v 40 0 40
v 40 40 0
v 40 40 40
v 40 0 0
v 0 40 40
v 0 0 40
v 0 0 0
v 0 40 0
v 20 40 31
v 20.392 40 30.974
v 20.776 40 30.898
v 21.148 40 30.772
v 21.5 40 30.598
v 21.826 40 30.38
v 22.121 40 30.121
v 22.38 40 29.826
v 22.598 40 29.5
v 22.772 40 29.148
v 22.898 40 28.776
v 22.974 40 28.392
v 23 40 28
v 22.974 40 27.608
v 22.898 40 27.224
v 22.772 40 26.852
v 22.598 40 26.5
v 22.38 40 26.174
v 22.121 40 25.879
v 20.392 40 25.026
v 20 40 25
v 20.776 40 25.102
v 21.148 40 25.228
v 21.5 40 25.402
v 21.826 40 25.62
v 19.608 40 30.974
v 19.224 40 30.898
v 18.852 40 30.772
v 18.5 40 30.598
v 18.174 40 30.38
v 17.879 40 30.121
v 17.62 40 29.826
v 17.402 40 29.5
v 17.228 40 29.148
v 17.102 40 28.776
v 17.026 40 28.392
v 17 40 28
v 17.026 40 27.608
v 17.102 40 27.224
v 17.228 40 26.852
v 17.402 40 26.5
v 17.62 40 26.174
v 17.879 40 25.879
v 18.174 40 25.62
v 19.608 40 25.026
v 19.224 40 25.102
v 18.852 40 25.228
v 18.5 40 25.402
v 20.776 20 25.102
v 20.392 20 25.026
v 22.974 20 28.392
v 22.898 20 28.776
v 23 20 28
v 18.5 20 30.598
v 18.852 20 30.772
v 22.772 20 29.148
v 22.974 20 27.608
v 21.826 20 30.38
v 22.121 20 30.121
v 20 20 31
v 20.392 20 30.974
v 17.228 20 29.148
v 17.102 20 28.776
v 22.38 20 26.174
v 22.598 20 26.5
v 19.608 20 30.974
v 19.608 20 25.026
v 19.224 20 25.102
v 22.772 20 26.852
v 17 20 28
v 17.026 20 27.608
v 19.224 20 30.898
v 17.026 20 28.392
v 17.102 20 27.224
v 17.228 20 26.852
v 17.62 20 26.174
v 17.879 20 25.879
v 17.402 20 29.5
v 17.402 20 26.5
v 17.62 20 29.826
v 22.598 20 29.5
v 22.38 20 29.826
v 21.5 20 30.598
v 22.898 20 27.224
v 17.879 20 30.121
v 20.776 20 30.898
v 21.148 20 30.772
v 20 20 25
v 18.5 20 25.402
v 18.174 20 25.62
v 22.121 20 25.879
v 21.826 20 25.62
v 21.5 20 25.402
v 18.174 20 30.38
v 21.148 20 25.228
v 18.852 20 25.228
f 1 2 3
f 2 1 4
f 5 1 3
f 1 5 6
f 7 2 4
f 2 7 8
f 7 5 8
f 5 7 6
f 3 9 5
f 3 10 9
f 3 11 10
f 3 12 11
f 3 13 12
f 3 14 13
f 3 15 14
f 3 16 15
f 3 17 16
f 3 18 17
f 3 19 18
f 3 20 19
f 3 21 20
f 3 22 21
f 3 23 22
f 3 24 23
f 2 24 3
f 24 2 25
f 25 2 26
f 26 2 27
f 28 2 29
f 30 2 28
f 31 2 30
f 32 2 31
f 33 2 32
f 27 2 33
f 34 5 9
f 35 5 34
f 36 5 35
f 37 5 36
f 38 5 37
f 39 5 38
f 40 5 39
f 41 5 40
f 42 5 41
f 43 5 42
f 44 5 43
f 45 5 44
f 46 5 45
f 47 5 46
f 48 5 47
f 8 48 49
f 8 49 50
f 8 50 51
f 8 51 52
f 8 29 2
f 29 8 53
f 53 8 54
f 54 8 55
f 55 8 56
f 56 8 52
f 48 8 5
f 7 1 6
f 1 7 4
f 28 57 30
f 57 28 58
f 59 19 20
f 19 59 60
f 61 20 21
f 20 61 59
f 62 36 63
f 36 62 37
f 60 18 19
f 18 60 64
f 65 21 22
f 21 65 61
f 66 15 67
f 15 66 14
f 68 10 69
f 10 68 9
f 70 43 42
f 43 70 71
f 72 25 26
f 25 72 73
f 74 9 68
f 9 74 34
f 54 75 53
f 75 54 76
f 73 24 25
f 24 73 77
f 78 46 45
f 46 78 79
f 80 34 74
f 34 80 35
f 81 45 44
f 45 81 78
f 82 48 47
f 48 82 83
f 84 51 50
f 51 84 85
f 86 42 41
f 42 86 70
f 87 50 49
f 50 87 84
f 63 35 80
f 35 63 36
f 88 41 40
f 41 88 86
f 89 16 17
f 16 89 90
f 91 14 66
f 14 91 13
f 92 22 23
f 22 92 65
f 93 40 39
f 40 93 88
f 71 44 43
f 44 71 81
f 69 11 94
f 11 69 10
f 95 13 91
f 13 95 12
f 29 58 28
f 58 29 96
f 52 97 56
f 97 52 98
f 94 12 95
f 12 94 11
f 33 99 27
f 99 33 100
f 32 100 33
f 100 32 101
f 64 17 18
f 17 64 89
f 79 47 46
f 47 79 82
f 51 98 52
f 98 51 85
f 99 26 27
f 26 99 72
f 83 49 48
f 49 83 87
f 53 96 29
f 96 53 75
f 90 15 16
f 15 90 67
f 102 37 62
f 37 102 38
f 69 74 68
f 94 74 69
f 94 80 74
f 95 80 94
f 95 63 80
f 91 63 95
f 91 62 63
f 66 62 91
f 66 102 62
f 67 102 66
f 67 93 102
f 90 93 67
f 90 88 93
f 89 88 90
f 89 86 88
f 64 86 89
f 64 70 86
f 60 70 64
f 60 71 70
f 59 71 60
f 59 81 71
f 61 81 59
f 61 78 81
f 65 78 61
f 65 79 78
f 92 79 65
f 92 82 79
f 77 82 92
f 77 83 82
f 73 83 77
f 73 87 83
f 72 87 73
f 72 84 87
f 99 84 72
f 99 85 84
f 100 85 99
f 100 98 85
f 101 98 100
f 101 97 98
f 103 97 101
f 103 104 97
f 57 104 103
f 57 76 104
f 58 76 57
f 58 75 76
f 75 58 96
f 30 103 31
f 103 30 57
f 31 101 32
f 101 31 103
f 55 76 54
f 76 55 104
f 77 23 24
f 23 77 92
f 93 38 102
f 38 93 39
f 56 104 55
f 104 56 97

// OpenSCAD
$fn=48;
difference(){ cube([40,40,40]); translate([20,40,28]) rotate([90,0,0]) cylinder(h=20,d=6); }
